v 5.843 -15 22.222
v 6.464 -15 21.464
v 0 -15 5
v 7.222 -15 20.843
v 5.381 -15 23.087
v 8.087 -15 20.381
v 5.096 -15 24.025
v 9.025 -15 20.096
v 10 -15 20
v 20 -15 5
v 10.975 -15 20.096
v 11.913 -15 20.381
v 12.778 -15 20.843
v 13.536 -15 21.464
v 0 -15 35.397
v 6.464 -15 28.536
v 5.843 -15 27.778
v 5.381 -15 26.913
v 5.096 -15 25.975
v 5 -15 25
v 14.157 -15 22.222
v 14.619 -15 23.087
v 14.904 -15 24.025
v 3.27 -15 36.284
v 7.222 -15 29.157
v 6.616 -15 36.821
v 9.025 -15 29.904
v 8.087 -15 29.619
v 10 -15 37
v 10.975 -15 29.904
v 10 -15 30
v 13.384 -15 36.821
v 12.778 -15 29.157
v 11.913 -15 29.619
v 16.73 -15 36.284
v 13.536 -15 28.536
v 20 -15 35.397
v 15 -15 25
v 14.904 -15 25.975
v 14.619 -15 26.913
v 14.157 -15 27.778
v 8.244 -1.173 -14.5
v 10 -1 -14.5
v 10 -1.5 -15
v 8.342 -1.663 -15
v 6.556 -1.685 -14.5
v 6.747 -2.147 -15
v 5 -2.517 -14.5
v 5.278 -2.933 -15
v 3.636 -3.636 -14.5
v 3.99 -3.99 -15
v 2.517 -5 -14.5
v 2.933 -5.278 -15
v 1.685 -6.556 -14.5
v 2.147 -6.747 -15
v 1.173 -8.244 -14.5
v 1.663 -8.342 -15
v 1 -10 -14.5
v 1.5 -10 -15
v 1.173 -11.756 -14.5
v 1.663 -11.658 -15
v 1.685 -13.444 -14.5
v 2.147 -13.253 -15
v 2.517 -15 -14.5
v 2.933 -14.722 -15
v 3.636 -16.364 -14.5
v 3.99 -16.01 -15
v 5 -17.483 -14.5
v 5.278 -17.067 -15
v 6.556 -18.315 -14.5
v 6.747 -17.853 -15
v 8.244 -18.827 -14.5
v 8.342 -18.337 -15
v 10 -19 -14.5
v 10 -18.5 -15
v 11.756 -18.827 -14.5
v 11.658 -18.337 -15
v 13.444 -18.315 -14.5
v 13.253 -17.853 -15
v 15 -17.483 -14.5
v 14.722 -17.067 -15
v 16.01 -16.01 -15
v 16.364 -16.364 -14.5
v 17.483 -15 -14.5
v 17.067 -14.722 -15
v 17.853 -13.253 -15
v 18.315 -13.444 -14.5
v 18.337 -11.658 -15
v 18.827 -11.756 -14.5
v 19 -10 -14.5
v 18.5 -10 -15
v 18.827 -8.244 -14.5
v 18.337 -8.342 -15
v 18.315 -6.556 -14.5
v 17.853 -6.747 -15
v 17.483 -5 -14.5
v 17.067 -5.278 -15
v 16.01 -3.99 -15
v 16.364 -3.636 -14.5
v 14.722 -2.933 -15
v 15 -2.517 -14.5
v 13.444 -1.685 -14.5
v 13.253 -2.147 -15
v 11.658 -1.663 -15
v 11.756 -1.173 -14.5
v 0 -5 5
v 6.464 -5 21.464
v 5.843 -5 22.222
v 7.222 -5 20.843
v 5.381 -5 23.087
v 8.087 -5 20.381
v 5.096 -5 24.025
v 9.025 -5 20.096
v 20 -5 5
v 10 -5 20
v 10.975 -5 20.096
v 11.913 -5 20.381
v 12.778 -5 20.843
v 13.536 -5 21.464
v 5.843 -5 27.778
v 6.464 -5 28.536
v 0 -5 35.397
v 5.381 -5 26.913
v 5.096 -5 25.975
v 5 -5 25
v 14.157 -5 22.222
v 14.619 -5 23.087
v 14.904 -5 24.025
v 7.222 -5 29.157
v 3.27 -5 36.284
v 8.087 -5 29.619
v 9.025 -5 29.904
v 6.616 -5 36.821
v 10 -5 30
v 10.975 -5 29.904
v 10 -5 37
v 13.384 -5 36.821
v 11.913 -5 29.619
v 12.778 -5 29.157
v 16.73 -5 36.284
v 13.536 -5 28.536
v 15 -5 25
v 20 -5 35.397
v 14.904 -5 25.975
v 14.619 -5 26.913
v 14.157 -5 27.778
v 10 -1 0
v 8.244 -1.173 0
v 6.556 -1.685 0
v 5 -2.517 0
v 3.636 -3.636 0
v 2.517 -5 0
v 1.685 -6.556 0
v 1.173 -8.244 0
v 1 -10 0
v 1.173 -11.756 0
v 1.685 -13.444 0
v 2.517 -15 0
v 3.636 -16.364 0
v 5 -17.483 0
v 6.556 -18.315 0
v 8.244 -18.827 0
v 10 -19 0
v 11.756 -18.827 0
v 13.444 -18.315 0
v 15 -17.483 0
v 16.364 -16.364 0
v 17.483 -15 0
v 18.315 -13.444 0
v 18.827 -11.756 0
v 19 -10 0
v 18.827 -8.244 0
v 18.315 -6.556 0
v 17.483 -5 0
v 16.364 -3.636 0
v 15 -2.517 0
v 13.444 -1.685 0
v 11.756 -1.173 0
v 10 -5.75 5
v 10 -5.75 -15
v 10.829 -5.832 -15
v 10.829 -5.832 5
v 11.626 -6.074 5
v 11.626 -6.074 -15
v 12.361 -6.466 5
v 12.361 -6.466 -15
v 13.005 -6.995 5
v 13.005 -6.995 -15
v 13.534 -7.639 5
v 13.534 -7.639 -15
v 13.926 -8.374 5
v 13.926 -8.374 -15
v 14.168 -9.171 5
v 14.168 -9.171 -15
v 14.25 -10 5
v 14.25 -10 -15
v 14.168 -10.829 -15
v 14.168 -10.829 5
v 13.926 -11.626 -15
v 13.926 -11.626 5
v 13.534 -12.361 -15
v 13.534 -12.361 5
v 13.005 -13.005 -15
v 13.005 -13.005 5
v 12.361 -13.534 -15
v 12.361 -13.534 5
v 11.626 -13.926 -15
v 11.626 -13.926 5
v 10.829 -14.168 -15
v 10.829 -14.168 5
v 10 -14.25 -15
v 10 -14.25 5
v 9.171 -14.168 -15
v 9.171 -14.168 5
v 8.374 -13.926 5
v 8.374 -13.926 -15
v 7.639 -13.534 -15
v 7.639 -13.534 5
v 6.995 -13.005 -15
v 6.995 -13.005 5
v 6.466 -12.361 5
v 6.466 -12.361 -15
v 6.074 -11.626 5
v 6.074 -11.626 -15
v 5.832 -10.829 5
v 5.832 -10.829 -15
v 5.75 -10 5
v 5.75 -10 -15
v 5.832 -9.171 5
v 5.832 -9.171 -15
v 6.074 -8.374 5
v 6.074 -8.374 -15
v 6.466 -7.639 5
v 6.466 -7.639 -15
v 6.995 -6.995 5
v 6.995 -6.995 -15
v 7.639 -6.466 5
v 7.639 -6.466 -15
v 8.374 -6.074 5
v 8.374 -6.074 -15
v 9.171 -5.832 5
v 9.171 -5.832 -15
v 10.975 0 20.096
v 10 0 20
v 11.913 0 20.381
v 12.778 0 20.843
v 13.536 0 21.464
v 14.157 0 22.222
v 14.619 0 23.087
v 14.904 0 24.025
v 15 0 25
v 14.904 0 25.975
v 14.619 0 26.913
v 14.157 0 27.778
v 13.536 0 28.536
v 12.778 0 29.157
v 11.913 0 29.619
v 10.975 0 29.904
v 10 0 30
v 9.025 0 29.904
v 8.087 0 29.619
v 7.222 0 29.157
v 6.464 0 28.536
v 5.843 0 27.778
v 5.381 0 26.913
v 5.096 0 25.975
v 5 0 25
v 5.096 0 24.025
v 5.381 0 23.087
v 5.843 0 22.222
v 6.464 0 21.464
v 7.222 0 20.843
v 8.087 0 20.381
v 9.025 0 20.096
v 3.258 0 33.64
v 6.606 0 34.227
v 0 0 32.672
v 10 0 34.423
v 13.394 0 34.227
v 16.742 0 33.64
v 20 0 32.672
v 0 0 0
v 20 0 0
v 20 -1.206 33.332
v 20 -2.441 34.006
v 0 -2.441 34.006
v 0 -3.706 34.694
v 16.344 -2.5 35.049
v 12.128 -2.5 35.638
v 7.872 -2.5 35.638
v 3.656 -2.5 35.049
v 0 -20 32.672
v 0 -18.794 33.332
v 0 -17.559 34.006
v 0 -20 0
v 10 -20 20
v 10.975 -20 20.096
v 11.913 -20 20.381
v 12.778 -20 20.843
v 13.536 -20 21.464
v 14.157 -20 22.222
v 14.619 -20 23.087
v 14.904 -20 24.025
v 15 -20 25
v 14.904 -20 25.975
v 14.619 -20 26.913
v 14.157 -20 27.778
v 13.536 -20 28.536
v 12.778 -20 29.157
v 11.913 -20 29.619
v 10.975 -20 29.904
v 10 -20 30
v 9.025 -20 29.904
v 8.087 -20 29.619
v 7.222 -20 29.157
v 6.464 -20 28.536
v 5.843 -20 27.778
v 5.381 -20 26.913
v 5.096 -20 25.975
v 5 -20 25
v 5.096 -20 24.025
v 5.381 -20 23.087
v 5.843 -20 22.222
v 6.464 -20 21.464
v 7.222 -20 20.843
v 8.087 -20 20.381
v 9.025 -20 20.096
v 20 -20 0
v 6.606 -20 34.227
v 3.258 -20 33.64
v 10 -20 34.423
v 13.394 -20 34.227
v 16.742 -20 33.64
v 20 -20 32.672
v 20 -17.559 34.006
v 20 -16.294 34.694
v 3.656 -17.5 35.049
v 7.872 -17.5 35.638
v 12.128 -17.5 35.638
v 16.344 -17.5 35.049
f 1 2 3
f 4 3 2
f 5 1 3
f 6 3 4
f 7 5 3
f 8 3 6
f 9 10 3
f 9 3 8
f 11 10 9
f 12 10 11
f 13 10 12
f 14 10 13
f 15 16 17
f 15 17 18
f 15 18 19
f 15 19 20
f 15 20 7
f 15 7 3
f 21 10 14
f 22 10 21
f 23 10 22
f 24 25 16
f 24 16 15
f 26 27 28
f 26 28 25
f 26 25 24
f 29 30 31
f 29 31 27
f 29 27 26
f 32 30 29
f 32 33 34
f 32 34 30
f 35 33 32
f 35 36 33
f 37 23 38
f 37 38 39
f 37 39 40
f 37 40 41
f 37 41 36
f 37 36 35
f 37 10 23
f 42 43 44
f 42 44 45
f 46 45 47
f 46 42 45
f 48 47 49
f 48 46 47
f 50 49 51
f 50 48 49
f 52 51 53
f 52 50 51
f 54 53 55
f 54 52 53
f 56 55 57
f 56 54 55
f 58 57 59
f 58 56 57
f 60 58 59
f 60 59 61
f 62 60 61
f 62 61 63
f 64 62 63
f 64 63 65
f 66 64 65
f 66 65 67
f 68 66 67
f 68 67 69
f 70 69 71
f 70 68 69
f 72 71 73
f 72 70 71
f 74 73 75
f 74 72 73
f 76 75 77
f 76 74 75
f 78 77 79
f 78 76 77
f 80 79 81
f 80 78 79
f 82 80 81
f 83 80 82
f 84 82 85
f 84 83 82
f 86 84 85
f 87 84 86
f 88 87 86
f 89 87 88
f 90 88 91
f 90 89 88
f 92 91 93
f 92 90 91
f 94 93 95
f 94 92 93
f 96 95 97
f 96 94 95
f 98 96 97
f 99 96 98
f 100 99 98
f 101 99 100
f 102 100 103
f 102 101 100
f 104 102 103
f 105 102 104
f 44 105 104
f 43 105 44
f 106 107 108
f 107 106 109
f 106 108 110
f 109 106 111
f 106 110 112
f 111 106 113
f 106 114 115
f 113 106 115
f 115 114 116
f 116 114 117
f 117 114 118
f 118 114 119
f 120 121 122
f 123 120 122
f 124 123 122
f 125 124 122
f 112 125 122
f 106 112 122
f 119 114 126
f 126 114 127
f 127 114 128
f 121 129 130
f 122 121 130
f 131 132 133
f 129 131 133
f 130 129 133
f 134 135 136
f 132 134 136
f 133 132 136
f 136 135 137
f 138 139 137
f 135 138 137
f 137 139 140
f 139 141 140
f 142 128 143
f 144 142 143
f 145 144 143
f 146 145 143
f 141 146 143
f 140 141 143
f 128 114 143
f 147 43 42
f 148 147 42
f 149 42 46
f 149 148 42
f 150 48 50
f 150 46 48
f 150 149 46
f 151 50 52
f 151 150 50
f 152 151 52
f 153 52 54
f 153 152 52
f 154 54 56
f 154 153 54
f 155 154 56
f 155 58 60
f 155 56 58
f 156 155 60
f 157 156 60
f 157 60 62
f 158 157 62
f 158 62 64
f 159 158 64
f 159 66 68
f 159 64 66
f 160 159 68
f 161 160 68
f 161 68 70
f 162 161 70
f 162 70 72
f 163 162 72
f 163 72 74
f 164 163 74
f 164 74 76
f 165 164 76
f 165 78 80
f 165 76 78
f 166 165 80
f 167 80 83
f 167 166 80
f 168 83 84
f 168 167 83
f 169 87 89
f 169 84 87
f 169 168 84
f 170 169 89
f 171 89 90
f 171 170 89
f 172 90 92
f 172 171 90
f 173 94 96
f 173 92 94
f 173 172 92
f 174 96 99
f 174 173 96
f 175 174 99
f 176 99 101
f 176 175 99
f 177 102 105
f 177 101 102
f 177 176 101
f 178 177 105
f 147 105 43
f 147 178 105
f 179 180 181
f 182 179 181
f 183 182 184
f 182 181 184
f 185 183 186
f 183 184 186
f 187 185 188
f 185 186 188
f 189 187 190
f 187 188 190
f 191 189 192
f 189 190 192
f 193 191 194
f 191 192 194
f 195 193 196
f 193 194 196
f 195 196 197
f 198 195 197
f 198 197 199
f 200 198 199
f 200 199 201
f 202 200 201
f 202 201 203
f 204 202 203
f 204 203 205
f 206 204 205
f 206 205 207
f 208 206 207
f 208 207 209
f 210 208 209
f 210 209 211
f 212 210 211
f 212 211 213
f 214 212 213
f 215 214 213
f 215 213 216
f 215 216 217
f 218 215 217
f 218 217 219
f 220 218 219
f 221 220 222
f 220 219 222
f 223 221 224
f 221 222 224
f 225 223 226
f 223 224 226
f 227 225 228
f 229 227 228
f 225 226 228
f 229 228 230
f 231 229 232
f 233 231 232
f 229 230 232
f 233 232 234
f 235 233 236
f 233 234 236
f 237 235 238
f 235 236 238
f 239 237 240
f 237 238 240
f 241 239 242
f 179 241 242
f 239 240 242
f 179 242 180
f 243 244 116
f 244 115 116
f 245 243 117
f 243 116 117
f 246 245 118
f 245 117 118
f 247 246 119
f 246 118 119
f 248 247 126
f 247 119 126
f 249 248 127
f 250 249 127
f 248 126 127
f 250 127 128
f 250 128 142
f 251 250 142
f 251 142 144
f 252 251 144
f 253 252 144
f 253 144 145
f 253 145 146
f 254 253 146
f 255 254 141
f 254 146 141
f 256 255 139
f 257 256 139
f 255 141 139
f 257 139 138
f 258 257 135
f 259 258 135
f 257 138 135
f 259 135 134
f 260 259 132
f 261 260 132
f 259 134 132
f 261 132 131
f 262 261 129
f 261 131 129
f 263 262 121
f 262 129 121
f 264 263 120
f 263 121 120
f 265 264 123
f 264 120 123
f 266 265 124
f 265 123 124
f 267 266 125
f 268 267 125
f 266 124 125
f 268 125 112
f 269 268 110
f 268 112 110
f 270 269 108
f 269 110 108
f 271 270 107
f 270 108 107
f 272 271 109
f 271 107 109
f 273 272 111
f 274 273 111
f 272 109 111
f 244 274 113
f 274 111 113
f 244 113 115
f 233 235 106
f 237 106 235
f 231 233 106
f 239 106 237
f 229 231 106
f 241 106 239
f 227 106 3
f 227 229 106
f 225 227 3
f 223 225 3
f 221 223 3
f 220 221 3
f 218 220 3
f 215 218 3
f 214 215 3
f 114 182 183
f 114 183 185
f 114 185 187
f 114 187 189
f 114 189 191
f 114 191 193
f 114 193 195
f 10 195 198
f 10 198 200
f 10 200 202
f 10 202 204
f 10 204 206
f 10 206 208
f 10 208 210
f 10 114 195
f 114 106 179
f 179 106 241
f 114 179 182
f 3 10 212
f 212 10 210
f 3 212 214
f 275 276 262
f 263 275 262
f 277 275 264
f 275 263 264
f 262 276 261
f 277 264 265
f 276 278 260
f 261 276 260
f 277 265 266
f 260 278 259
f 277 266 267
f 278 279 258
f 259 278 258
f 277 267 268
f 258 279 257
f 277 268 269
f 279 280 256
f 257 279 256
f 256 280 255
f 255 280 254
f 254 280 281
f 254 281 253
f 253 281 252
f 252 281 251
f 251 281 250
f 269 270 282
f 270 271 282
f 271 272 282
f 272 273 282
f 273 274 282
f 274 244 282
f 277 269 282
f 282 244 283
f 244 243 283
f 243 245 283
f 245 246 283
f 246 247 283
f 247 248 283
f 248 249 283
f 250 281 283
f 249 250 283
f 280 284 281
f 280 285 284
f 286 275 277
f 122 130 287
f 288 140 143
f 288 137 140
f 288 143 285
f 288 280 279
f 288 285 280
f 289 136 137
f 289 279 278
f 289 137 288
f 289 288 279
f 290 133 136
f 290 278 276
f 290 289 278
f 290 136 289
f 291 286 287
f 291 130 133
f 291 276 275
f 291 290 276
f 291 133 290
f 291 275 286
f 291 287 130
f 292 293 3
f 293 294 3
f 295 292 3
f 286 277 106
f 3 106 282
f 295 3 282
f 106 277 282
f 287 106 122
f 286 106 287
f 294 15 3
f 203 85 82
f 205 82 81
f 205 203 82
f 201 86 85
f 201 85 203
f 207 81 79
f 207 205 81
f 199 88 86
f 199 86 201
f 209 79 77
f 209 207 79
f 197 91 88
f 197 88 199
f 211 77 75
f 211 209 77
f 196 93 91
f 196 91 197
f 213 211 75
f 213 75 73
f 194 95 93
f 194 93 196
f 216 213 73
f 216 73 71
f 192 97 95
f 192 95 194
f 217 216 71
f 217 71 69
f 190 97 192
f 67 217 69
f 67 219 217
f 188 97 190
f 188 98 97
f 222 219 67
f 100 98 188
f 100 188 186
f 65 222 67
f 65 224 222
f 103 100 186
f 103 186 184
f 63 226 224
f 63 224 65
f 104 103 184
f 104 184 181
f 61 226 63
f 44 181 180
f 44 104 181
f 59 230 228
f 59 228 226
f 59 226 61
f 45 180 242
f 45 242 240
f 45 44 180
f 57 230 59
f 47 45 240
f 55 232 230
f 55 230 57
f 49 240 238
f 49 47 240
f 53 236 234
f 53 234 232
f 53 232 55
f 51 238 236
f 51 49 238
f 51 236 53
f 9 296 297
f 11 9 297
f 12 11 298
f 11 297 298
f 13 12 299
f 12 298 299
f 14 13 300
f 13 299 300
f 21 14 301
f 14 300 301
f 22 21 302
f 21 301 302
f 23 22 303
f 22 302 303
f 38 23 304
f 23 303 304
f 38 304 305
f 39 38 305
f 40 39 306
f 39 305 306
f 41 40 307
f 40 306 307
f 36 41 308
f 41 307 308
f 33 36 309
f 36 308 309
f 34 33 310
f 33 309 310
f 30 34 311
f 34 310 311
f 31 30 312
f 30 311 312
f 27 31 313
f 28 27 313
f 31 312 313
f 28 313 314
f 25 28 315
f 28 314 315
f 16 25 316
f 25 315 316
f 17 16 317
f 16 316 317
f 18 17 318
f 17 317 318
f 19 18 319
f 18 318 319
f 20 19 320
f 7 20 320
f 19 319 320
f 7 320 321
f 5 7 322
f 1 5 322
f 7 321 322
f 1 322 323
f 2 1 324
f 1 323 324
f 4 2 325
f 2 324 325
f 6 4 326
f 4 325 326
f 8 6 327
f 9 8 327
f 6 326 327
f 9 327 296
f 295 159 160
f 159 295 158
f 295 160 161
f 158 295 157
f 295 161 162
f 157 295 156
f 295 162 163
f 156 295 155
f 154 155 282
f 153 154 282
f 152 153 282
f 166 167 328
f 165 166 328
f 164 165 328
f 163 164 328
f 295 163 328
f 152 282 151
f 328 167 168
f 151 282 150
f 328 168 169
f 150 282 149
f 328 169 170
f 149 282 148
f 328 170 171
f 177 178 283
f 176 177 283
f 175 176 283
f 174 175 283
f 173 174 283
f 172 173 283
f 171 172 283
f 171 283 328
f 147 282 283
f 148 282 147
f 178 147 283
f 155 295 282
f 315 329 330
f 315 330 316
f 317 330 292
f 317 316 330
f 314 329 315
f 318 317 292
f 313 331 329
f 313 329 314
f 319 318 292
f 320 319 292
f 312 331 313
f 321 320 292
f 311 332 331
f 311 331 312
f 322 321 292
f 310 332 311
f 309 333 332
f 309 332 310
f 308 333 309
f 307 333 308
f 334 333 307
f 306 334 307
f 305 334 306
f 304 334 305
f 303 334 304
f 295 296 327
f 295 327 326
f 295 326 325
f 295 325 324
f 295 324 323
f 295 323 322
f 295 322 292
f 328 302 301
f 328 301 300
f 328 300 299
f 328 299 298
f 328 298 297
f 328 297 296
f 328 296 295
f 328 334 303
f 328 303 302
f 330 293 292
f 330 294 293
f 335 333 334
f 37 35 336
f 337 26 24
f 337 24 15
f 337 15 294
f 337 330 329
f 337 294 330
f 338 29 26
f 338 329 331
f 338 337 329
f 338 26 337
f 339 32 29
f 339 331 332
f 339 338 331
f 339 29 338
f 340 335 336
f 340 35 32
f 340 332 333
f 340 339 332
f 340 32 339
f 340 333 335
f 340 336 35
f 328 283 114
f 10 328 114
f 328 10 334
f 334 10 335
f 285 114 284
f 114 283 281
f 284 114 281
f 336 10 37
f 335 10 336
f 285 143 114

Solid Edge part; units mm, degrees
sketch "Sketch1" plane through (0, 0, 0) normal (0, -1, 0) x (1, 0, 0)
  line L0 (0, 0) -> (20, 0)
  line L1 (20, 0) -> (20, 37)
  line L2 (20, 37) -> (0, 37)
  line L3 (0, 37) -> (0, 0)
extrude "Protrusion1" add sketch "Sketch1" along normal blind 20
sketch "Sketch2" plane through (20, -10, 18.5) normal (1, 0, 0) x (0, 1, 0)
  line L0 (5, -13.5) -> (5, 20.0916)
  line L1 (5, -13.5) -> (-5, -13.5)
  line L2 (-5, -13.5) -> (-5, 24.1099)
extrude "Cutout1" cut sketch "Sketch2" against normal blind 44.45 material side at (20, -5.05, 21.7958)
sketch "Sketch3" plane through (10, -10, 0) normal (0, 0, -1) x (0, 1, 0)
  circle A0 centre (0, 0) radius 9
extrude "Protrusion2" add sketch "Sketch3" along normal blind 15
chamfer "Chamfer1" distance 0.5 angle 45 1 edges at (10, -19, -15)
hole "Hole1" at (10, -10, -15) direction (0, 0, 1) diameter 8.5 end through all
hole "Hole_2" at (10, -20, 25) direction (0, 1, 0) diameter 10 end through all
sketch "Sketch4" plane through (10, -10, 18.5) normal (1, 0, 0) x (0, 1, 0)
  line L0 (10.8209, 15.5) -> (5, 18.5)
  line L1 (-5, 18.5) -> (5, 18.5)
  line L2 (-10.8209, 15.5) -> (-5, 18.5)
revolve "RevolvedCutout1" cut sketch "Sketch4" angle 70 mid plane about axis through (10, -5, 5) along (0, -1, 0) material side at (10, -2.0666, 35.5444)
properties part number "45644"
